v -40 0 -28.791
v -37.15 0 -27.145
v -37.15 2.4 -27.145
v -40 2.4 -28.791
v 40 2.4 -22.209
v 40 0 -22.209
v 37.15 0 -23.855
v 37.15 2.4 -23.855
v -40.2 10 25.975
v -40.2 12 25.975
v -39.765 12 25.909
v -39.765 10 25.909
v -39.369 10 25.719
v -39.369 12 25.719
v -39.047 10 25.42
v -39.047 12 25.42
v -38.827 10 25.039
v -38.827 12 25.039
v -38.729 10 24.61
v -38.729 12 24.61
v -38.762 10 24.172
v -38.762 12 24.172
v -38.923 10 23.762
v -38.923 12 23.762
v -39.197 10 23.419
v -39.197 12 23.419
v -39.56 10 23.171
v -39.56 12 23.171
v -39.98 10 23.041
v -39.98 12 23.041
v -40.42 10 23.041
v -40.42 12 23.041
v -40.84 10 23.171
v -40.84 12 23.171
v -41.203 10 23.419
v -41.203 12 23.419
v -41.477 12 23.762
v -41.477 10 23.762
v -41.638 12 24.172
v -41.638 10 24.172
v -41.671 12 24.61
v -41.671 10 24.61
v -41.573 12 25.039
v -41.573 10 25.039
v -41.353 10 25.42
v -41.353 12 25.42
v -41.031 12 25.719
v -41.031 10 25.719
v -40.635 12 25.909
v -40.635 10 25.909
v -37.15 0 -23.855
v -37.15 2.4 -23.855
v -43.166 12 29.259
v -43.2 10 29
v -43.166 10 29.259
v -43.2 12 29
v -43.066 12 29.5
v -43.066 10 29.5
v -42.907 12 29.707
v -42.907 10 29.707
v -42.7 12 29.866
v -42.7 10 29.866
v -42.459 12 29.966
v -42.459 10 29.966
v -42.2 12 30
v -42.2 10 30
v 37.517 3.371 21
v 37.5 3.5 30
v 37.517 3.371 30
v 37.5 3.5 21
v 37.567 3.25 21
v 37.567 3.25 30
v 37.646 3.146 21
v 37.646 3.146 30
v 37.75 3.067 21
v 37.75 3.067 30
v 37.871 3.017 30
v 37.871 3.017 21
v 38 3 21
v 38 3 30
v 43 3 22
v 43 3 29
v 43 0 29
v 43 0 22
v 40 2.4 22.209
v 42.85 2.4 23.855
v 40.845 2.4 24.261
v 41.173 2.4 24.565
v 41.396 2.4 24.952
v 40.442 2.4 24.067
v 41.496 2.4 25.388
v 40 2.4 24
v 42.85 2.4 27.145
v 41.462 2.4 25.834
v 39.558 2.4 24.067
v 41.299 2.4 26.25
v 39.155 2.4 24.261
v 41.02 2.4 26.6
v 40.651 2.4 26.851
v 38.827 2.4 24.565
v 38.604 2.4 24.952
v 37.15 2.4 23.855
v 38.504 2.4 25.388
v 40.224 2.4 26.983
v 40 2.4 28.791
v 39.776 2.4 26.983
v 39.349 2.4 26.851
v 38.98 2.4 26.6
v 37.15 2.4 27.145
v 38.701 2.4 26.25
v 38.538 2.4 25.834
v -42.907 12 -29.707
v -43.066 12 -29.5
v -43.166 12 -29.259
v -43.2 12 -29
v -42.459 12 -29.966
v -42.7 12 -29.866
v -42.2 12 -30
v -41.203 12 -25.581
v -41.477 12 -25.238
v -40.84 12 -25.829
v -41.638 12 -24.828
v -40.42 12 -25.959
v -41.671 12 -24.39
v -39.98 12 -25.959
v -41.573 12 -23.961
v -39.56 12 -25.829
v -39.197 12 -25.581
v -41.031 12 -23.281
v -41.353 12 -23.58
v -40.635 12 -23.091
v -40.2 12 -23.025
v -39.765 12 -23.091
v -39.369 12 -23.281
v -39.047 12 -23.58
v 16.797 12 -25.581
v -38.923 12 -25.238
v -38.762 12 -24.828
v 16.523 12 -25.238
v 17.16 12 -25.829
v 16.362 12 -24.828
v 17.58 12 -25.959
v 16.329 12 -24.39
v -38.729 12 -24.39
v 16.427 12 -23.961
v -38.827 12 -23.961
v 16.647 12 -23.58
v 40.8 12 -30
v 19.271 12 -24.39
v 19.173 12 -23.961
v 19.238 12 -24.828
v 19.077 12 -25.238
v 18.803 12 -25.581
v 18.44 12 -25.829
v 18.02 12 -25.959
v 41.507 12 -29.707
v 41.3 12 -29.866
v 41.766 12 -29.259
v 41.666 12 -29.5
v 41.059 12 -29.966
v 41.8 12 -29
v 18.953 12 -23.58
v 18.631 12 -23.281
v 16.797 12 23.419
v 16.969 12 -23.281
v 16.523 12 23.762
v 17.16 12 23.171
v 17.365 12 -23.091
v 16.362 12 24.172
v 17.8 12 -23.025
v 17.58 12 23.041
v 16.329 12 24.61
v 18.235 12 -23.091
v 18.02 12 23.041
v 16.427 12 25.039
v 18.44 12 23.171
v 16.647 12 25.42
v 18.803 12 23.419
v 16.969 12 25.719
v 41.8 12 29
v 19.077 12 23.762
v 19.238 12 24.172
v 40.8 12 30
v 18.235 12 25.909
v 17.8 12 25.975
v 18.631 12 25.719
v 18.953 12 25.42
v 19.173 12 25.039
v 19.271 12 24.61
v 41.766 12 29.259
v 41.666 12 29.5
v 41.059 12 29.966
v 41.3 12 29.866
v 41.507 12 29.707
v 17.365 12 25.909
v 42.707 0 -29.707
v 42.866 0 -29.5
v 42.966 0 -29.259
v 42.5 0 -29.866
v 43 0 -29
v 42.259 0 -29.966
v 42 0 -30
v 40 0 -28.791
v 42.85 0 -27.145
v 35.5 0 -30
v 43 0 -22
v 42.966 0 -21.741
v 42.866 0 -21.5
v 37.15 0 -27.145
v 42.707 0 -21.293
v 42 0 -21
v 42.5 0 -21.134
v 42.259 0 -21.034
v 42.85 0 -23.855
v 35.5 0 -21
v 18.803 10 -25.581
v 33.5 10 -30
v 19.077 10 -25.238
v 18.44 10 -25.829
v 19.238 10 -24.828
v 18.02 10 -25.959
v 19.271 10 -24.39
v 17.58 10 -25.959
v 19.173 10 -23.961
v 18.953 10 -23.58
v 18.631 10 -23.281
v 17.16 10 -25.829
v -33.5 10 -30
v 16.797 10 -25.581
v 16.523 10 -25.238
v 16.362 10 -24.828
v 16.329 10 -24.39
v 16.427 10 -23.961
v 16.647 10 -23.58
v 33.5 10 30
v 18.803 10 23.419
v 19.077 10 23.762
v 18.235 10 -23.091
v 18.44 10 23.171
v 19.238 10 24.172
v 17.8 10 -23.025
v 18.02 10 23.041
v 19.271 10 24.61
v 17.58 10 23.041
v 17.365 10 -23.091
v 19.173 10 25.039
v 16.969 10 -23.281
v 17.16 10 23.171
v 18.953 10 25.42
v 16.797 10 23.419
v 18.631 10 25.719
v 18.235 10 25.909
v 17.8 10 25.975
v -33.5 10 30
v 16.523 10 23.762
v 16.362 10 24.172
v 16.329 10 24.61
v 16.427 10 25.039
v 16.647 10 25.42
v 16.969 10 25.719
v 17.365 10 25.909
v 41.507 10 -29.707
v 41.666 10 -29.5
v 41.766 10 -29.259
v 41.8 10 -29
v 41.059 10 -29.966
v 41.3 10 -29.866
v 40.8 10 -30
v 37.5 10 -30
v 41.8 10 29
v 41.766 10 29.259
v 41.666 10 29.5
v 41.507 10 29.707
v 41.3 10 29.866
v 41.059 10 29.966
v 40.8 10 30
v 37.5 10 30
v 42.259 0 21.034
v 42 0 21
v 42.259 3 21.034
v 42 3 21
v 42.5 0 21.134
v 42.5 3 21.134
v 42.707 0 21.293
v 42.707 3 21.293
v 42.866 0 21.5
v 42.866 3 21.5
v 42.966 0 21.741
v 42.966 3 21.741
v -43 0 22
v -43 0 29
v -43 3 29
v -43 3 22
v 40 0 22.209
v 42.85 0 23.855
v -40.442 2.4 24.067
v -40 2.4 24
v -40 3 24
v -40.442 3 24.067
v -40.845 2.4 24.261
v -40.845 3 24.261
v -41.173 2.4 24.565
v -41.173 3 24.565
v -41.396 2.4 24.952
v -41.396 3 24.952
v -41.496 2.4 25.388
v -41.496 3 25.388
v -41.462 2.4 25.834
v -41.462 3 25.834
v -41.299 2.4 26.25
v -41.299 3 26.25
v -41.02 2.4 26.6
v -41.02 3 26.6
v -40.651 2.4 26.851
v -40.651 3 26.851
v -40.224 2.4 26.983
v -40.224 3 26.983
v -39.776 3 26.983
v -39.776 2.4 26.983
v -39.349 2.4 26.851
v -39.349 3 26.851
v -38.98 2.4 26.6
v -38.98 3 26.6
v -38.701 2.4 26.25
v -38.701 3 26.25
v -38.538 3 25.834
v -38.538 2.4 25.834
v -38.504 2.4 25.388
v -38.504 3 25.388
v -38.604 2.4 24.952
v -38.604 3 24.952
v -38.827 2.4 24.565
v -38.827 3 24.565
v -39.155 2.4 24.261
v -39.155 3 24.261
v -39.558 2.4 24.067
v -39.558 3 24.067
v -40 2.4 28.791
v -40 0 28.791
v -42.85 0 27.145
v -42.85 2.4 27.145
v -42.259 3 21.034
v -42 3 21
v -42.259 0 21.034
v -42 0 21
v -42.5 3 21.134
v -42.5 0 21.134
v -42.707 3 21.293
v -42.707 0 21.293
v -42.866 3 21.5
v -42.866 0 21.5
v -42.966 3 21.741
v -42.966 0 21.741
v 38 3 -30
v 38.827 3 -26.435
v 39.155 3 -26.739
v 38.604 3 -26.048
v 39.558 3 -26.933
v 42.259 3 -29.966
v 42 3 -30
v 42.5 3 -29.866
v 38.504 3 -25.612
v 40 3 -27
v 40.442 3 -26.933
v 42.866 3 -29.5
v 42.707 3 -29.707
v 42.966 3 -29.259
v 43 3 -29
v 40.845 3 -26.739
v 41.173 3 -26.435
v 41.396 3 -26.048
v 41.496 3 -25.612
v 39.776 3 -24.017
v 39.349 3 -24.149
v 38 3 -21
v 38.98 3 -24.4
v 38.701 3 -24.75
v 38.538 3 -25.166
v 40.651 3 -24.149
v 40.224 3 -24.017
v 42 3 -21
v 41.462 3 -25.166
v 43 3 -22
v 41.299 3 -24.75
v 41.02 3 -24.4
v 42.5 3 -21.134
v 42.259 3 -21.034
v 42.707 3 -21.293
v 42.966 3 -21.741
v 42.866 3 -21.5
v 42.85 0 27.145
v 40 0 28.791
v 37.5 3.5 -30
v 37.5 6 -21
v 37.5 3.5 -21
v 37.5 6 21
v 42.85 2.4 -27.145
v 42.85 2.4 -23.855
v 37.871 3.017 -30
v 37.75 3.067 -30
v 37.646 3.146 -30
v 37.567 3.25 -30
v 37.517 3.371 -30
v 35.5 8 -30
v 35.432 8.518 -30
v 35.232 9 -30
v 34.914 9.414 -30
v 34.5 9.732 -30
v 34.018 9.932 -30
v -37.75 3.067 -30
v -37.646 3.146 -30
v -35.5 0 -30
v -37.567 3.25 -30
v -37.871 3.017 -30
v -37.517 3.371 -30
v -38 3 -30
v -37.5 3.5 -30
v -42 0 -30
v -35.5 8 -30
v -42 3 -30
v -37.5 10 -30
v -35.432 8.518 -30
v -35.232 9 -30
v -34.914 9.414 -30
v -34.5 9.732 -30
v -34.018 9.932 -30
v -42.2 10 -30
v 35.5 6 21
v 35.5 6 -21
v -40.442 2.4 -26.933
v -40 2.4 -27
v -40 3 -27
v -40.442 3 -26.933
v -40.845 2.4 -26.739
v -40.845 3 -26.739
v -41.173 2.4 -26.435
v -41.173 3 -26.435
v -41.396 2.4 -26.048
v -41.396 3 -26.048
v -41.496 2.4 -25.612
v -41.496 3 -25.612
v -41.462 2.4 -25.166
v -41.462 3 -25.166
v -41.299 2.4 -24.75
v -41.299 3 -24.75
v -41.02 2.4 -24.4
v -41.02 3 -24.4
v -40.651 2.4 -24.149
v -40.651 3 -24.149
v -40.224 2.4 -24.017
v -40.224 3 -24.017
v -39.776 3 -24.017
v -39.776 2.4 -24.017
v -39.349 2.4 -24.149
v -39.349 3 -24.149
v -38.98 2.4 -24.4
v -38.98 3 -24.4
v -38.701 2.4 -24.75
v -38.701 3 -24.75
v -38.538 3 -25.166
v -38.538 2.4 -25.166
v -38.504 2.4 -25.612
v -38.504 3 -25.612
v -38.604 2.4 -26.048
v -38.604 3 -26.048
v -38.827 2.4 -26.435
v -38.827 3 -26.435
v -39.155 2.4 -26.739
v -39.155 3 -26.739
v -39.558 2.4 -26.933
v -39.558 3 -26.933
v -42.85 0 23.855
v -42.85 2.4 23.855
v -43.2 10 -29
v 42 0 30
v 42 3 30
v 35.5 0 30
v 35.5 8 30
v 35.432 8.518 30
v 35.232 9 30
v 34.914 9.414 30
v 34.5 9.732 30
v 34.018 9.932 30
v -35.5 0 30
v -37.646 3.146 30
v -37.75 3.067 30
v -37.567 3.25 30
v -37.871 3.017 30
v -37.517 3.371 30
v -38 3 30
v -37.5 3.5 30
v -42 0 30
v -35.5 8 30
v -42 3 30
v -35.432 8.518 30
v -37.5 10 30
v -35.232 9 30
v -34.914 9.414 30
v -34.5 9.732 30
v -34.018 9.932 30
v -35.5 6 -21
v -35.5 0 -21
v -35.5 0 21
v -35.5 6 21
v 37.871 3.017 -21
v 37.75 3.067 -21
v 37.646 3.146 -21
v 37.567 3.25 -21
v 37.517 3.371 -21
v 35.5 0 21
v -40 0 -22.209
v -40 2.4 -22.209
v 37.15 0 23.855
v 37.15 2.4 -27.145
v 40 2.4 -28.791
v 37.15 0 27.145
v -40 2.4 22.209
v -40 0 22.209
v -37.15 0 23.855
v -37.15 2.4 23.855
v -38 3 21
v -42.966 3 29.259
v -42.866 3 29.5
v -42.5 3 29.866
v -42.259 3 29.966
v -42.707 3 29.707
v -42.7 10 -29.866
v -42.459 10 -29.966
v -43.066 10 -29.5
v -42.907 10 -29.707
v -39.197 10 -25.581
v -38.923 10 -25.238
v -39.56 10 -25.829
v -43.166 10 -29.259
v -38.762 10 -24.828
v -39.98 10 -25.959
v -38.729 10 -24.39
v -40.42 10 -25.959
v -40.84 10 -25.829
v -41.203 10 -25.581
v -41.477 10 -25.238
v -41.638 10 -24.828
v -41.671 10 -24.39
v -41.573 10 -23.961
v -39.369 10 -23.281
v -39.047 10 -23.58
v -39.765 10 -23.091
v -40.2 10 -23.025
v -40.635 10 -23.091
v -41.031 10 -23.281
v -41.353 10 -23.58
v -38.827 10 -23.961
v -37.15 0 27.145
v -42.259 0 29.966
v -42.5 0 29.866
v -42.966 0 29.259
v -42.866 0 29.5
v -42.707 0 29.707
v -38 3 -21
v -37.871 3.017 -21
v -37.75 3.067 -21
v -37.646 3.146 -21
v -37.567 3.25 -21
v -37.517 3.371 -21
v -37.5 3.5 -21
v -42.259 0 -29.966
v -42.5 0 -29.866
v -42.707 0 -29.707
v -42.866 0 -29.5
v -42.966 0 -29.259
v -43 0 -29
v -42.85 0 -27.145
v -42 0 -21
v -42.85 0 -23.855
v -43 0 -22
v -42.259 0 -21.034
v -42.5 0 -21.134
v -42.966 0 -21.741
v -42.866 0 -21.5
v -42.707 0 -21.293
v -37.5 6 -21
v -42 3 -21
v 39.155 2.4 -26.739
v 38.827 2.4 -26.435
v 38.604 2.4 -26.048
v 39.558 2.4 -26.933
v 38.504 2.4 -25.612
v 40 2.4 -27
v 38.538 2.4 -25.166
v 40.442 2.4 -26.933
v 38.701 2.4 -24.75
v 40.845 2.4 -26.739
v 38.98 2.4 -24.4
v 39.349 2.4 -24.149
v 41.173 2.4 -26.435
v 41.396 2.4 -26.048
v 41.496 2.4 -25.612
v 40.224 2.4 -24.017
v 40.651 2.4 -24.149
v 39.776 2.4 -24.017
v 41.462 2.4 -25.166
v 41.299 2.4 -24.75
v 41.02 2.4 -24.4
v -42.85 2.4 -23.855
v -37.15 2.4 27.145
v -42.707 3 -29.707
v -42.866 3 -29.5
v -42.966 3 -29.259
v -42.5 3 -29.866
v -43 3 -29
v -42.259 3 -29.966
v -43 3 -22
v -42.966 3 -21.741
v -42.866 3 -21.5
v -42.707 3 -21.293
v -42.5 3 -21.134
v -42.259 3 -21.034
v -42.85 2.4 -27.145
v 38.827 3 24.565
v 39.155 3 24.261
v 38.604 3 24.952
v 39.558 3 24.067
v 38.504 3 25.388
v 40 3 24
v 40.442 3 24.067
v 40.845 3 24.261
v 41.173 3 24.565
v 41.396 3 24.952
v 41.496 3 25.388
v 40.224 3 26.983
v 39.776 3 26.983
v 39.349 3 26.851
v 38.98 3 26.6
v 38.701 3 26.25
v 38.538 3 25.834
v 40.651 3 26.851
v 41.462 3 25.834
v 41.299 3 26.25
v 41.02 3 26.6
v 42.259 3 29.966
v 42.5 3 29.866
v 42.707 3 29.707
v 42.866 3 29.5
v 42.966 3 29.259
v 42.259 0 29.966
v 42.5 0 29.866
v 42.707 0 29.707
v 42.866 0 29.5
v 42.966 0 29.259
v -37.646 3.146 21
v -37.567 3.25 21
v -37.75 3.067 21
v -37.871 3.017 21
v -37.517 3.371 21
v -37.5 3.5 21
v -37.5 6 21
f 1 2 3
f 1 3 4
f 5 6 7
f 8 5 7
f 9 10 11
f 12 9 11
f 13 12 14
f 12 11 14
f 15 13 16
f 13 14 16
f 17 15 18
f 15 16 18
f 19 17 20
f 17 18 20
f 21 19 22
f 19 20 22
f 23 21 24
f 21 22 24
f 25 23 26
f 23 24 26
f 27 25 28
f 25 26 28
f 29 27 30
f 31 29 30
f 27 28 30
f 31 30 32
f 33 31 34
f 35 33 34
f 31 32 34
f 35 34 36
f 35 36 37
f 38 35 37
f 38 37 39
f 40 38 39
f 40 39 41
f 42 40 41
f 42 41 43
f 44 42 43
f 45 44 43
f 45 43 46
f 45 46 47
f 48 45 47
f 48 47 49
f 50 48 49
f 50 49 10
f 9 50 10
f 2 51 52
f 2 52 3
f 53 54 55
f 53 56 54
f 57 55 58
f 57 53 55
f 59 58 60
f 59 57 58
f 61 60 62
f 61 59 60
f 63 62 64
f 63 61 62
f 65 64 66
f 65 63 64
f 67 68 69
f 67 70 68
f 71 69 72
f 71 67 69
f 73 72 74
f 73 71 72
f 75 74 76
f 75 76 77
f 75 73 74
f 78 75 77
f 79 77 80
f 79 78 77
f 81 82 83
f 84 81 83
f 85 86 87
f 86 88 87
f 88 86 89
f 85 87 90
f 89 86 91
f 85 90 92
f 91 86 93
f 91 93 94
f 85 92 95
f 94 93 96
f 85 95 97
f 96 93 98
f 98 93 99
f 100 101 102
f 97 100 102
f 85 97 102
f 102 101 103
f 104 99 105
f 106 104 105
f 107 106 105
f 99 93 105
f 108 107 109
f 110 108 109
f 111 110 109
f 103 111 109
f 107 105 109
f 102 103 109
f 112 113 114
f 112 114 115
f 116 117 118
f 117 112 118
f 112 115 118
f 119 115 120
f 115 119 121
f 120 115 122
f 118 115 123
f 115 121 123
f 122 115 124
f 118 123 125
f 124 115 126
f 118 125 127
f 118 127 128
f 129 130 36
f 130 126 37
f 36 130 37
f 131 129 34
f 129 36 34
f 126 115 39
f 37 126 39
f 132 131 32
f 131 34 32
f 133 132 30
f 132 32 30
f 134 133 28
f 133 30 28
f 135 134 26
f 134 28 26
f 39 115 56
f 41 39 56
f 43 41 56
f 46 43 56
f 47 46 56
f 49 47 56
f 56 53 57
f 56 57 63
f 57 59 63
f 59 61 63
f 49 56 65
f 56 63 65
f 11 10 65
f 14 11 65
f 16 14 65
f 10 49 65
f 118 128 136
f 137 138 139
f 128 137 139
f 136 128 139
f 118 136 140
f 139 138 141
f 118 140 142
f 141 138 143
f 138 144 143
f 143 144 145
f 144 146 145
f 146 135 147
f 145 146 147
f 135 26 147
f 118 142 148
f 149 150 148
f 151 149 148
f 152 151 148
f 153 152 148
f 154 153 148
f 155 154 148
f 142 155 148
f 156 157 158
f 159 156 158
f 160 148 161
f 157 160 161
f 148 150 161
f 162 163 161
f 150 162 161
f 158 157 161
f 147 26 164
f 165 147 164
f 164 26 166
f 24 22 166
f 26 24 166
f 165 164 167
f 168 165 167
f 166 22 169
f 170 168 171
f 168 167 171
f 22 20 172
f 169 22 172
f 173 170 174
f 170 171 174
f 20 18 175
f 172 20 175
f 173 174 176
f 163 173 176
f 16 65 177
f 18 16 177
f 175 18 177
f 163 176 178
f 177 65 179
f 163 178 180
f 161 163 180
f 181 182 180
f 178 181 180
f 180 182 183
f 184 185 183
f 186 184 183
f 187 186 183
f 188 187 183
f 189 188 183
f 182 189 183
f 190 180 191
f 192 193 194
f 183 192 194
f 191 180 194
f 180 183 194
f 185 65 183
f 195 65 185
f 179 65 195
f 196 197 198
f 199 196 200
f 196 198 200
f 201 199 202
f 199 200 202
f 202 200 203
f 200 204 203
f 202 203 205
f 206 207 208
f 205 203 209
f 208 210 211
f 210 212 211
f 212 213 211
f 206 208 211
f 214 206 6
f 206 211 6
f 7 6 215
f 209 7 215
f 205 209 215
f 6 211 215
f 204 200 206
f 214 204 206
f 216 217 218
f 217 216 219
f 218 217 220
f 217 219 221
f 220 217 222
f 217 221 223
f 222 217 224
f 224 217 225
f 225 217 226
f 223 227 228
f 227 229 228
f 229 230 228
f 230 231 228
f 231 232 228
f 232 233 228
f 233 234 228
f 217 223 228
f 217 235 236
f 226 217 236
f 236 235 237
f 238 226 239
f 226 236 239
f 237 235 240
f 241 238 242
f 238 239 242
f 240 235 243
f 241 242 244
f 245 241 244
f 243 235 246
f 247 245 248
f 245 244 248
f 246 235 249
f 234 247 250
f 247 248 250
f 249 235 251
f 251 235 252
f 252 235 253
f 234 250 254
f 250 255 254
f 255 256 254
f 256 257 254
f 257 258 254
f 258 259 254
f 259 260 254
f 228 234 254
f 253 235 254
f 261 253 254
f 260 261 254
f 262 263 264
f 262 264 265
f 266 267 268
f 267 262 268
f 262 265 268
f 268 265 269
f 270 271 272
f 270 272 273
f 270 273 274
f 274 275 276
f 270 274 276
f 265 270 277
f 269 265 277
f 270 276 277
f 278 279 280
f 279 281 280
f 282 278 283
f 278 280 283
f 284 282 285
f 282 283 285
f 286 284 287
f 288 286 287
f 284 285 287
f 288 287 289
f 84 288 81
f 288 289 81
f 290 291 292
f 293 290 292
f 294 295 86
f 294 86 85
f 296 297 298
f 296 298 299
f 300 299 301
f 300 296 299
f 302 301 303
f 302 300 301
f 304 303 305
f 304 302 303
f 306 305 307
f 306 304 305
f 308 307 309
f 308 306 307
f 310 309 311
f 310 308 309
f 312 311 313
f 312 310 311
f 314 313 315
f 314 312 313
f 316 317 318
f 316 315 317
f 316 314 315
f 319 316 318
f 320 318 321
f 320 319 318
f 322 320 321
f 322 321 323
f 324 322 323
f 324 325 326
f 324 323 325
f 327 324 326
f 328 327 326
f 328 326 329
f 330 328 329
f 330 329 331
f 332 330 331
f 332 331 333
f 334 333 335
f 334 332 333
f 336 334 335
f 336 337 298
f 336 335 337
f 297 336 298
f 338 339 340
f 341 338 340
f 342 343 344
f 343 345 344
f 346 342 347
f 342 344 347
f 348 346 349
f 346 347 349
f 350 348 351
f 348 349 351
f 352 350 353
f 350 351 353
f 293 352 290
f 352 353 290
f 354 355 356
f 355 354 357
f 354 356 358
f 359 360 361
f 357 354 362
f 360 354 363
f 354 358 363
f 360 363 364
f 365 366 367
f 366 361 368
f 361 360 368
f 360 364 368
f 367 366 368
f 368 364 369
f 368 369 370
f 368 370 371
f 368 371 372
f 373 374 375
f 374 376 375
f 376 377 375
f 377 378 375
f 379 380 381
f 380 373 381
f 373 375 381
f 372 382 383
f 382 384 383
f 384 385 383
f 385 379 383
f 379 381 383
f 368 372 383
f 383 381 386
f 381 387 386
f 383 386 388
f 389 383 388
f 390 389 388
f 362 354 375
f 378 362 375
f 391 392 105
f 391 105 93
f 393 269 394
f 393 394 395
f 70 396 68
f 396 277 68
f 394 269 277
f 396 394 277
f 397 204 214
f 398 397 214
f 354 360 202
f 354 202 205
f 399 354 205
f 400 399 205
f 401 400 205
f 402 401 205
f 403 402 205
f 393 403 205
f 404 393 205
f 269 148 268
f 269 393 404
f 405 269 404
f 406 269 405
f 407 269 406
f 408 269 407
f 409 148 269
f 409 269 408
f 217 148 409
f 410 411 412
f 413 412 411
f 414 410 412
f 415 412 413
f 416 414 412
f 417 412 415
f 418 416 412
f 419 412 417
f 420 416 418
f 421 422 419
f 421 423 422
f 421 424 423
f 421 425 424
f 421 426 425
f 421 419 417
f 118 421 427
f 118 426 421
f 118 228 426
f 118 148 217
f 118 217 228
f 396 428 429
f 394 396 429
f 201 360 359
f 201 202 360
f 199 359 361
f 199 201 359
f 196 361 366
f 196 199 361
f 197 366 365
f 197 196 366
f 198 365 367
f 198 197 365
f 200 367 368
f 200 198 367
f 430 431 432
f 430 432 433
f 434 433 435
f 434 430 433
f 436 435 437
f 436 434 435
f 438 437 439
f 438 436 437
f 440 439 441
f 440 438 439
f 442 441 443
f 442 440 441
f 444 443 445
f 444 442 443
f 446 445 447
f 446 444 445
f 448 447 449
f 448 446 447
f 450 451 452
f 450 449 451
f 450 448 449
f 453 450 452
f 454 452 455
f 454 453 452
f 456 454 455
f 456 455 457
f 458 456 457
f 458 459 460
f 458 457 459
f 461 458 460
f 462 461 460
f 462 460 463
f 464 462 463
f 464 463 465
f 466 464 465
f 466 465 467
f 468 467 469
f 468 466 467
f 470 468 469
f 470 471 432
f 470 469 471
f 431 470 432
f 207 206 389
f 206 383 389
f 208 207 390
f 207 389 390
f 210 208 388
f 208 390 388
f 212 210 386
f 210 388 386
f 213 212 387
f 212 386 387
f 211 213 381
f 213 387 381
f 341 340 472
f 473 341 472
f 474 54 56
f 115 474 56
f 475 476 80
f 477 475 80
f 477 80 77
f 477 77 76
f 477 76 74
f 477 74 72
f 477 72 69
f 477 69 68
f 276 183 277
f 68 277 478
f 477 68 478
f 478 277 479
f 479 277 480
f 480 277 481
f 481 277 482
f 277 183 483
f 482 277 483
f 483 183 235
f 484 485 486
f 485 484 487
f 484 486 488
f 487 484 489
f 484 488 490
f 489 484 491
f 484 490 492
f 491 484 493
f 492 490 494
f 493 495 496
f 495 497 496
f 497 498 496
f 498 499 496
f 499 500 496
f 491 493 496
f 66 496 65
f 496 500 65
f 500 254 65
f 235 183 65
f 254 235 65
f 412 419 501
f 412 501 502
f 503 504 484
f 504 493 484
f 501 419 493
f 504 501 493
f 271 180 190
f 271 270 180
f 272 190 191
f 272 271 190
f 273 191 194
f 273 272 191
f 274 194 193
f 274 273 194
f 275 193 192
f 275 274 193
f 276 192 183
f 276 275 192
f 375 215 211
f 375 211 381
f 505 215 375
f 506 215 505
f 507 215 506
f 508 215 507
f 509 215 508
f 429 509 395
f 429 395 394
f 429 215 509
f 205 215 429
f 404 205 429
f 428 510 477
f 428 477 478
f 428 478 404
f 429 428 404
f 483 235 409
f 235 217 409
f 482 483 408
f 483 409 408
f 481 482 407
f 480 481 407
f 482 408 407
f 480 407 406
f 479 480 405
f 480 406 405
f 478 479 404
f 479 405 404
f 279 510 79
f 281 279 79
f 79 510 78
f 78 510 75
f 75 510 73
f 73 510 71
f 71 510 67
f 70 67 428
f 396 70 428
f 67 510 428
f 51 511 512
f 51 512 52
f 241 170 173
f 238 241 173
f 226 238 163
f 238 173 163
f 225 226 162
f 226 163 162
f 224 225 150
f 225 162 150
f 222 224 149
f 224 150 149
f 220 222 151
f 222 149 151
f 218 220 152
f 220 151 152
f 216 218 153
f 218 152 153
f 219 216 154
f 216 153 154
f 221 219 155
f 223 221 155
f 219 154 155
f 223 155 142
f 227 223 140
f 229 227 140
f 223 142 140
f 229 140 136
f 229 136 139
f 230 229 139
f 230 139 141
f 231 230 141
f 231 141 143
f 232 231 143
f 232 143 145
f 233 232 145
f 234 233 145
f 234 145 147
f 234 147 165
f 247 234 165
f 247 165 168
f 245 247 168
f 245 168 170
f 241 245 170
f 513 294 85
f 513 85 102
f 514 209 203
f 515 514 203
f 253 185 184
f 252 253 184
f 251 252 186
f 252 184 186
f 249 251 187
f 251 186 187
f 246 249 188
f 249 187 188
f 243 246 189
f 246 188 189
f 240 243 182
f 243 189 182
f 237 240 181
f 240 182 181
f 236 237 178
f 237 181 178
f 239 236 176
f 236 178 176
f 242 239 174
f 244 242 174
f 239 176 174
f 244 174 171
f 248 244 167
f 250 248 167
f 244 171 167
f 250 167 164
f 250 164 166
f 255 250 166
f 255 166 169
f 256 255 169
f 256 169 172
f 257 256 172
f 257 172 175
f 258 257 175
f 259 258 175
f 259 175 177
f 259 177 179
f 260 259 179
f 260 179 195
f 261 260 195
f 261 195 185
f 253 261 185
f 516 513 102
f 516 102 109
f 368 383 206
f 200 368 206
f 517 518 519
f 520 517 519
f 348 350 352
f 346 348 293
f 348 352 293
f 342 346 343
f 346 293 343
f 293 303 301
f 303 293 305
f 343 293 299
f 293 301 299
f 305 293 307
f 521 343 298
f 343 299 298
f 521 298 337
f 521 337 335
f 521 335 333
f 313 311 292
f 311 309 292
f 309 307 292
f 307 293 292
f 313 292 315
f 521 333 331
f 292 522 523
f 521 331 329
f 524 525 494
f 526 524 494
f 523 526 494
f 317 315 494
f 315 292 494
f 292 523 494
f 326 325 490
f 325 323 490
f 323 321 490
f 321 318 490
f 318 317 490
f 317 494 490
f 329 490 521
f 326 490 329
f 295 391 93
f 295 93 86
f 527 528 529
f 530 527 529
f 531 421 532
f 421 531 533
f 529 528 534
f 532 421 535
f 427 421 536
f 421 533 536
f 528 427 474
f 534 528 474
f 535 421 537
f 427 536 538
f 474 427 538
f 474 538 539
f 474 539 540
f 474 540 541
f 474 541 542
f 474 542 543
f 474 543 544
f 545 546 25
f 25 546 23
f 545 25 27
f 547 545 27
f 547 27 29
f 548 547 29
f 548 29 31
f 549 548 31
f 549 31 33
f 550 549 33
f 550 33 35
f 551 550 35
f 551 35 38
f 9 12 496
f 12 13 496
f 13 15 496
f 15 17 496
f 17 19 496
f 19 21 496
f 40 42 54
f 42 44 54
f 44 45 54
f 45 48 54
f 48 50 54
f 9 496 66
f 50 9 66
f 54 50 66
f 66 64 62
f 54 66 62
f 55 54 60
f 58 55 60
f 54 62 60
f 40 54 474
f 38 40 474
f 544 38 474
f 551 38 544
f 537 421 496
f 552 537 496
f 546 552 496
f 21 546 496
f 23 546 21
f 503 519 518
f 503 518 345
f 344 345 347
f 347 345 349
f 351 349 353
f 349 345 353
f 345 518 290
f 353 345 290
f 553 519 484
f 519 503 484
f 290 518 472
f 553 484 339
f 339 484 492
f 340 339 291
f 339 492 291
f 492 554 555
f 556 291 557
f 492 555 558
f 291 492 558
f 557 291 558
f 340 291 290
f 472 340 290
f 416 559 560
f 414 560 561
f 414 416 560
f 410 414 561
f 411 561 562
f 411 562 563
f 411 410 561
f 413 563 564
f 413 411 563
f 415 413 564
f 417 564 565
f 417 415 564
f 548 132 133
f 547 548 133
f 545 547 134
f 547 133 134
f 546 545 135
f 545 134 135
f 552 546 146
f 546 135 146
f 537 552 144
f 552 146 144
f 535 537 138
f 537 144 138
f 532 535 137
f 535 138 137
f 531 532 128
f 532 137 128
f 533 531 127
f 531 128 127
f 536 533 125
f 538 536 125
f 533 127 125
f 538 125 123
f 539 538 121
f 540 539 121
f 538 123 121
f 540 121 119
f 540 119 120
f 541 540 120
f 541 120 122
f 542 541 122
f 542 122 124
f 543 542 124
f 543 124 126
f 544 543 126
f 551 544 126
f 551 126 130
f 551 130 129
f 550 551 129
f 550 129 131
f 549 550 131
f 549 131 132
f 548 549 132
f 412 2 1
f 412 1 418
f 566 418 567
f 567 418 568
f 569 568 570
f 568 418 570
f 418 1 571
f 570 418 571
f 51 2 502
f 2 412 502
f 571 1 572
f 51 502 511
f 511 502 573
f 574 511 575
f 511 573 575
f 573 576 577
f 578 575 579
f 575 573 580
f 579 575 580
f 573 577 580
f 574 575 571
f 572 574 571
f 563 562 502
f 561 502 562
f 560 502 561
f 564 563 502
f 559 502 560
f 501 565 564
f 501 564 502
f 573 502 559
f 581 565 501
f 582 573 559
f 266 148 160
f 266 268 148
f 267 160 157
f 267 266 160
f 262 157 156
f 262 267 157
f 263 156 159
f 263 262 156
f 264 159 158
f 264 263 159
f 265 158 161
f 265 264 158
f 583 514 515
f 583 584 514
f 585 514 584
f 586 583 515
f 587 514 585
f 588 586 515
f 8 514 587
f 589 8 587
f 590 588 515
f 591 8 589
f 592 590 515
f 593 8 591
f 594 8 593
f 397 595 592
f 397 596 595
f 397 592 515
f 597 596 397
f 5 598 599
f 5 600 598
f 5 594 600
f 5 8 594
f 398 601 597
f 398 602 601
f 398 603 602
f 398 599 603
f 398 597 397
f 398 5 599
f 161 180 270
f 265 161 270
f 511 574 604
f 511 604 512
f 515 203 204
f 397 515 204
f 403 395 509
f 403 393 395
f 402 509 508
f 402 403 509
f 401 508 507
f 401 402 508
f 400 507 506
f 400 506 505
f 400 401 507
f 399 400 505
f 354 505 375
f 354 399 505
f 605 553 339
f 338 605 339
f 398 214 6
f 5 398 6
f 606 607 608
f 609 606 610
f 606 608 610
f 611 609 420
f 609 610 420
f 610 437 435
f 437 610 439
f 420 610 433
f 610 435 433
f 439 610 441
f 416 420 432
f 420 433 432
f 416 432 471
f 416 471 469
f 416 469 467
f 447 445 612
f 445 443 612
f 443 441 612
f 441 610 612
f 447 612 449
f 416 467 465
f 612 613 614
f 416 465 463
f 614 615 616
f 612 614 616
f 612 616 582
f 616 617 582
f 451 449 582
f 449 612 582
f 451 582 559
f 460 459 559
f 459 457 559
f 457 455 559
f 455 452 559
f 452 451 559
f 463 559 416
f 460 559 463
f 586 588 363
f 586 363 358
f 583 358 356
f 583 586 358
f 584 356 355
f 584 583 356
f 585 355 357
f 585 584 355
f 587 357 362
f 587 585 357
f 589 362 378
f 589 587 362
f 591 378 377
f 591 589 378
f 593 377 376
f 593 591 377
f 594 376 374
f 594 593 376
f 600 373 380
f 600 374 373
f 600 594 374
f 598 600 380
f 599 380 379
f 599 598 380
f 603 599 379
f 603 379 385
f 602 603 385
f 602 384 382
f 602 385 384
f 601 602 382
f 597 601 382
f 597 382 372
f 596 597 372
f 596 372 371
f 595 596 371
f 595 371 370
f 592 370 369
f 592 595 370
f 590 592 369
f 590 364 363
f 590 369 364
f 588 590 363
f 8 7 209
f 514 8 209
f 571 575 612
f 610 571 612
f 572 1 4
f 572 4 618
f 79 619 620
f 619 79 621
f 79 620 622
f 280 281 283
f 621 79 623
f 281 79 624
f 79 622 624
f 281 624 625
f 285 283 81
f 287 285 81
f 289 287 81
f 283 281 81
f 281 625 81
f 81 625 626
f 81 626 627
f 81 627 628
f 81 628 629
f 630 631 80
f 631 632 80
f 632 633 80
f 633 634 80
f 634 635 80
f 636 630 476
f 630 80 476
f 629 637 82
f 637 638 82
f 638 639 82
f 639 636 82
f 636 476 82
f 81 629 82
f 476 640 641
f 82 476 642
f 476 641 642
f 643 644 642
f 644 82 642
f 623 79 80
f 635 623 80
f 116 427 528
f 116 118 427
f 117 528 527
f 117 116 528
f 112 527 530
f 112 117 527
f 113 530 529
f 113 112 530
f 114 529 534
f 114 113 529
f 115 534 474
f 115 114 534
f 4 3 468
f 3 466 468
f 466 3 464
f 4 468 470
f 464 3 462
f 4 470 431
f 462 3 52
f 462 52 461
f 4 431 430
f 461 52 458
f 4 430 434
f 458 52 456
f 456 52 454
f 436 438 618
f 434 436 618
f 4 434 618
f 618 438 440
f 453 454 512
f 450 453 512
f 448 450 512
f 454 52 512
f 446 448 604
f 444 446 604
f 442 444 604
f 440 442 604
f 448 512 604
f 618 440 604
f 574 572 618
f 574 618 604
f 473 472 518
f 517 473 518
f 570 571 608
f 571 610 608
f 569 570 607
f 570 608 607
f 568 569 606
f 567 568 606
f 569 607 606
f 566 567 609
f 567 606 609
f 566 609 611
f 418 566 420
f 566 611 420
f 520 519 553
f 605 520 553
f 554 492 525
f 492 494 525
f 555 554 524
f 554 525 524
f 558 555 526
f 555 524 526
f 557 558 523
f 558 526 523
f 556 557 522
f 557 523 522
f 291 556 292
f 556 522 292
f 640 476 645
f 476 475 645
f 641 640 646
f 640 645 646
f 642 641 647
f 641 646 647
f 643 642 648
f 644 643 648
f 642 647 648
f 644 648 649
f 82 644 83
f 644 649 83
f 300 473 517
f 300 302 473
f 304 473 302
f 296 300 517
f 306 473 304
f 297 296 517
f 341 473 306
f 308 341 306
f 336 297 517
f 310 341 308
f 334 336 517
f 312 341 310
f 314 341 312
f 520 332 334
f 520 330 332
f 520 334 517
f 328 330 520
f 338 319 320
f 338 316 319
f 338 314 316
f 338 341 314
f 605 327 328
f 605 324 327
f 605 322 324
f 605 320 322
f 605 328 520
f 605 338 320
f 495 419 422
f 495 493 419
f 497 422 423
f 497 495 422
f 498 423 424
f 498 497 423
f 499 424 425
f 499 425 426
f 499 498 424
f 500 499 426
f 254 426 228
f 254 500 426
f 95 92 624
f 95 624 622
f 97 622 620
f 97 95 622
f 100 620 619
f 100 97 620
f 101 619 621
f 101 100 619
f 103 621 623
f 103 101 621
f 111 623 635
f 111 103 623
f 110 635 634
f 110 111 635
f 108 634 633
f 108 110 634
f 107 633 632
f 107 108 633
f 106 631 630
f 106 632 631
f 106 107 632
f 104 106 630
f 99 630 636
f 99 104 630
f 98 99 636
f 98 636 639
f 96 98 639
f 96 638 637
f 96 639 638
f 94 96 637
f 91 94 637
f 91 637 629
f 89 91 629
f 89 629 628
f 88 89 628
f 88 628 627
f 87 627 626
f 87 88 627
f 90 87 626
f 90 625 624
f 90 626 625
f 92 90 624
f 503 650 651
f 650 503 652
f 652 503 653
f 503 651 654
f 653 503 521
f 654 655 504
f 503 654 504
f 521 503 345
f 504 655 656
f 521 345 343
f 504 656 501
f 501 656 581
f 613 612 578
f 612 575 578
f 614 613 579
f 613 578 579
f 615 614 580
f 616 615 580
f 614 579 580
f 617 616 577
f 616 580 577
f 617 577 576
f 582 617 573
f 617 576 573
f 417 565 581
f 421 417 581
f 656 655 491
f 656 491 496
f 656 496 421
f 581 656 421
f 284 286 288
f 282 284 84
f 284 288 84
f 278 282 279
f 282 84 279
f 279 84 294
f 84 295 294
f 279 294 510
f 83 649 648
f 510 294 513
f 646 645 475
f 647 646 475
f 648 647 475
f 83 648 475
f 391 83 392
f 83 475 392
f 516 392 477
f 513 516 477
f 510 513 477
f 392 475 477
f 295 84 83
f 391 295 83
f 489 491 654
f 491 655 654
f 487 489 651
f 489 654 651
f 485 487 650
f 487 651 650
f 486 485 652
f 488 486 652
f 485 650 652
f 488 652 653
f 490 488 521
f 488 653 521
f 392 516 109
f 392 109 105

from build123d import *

# Parameters (mm, degrees)
EXTRUDE_1_DEPTH          = 30
CUT_EXTRUDE_1_DEPTH      = 54.946640303
CUT_EXTRUDE_1_DEPTH_BACK = 54.946640303
SKETCH_2_W               = 42
SKETCH_2_H               = 12
CUT_EXTRUDE_4_REACH      = 55.947
SKETCH_3_R               = 1.5
SKETCH_5_R               = 1.475
CUT_EXTRUDE_5_DEPTH      = 5
CUT_EXTRUDE_7_DEPTH      = 2.4
FILLET_1_R               = 1
FILLET_5_R               = 0.5
FILLET_7_R               = 2


with BuildPart() as part:
    # 草圖1 → 填料-伸長1 (new, symmetric)
    with BuildSketch(Plane.XY):
        Polygon((-43, 0), (-43, 3), (-37.5, 3), (-37.5, 10), (-43.2, 10), (-43.2, 12), (41.8, 12), (41.8, 10), (37.5, 10), (37.5, 3), (43, 3), (43, 0), (35.5, 0), (35.5, 10), (-35.5, 10), (-35.5, 0), align=None)
    extrude(amount=EXTRUDE_1_DEPTH, both=True)

    # 草圖2 → 除料-伸長1 (cut, two sides: drawn at the far end of the back side and taken through both)
    with BuildSketch(Plane(origin=(0, 0, 0), x_dir=(0, 0, -1), z_dir=(1, 0, 0)).offset(-CUT_EXTRUDE_1_DEPTH_BACK)):
        Rectangle(SKETCH_2_W, SKETCH_2_H)
    extrude(amount=CUT_EXTRUDE_1_DEPTH + CUT_EXTRUDE_1_DEPTH_BACK, mode=Mode.SUBTRACT)

    # 草圖3 → 除料-伸長4 (cut, up to next)
    with BuildSketch(Plane(origin=(0, 0, 0), x_dir=(1, 0, 0), z_dir=(0, 1, 0)), mode=Mode.PRIVATE) as cut_extrude_4_sk1:
        with Locations(Location((-40, 25.5, 0), (0, 0, 90))):
            Circle(SKETCH_3_R)
    cut_extrude_4_tool1 = extrude(cut_extrude_4_sk1.sketch, amount=CUT_EXTRUDE_4_REACH, mode=Mode.PRIVATE) & part.part
    # 草圖3 → 除料-伸長4 (cut, up to next)
    with BuildSketch(Plane(origin=(0, 0, 0), x_dir=(1, 0, 0), z_dir=(0, 1, 0)), mode=Mode.PRIVATE) as cut_extrude_4_sk2:
        with Locations(Location((40, 25.5, 0), (0, 0, 90))):
            Circle(SKETCH_3_R)
    cut_extrude_4_tool2 = extrude(cut_extrude_4_sk2.sketch, amount=CUT_EXTRUDE_4_REACH, mode=Mode.PRIVATE) & part.part
    # 草圖3 → 除料-伸長4 (cut, up to next)
    with BuildSketch(Plane(origin=(0, 0, 0), x_dir=(1, 0, 0), z_dir=(0, 1, 0)), mode=Mode.PRIVATE) as cut_extrude_4_sk3:
        with Locations(Location((40, -25.5, 0), (0, 0, 90))):
            Circle(SKETCH_3_R)
    cut_extrude_4_tool3 = extrude(cut_extrude_4_sk3.sketch, amount=CUT_EXTRUDE_4_REACH, mode=Mode.PRIVATE) & part.part
    # 草圖3 → 除料-伸長4 (cut, up to next)
    with BuildSketch(Plane(origin=(0, 0, 0), x_dir=(1, 0, 0), z_dir=(0, 1, 0)), mode=Mode.PRIVATE) as cut_extrude_4_sk4:
        with Locations(Location((-40, -25.5, 0), (0, 0, 90))):
            Circle(SKETCH_3_R)
    cut_extrude_4_tool4 = extrude(cut_extrude_4_sk4.sketch, amount=CUT_EXTRUDE_4_REACH, mode=Mode.PRIVATE) & part.part
    add(cut_extrude_4_tool1.solids().sort_by_distance((-40, 0, -25.5))[0], mode=Mode.SUBTRACT)
    add(cut_extrude_4_tool2.solids().sort_by_distance((40, 0, -25.5))[0], mode=Mode.SUBTRACT)
    add(cut_extrude_4_tool3.solids().sort_by_distance((40, 0, 25.5))[0], mode=Mode.SUBTRACT)
    add(cut_extrude_4_tool4.solids().sort_by_distance((-40, 0, 25.5))[0], mode=Mode.SUBTRACT)

    # 草圖5 → 除料-伸長5 (cut)
    with BuildSketch(Plane(origin=(0, 12, 0), x_dir=(1, 0, 0), z_dir=(0, 1, 0))):
        with Locations(Location((-40.2, 24.5, 0), (0, 0, 270))):
            Circle(SKETCH_5_R)
        with Locations(Location((-40.2, -24.5, 0), (0, 0, 270))):
            Circle(SKETCH_5_R)
        with Locations(Location((17.8, 24.5, 0), (0, 0, 270))):
            Circle(SKETCH_5_R)
        with Locations(Location((17.8, -24.5, 0), (0, 0, 270))):
            Circle(SKETCH_5_R)
    extrude(amount=-CUT_EXTRUDE_5_DEPTH, mode=Mode.SUBTRACT)

    # 草圖16 → 除料-伸長7 (cut)
    with BuildSketch(Plane.XZ):
        Polygon((-40, 22.209103466), (-37.15, 23.854551733), (-37.15, 27.145448267), (-40, 28.790896534), (-42.85, 27.145448267), (-42.85, 23.854551733), align=None)
        Polygon((-42.85, -23.854551733), (-40, -22.209103466), (-37.15, -23.854551733), (-37.15, -27.145448267), (-40, -28.790896534), (-42.85, -27.145448267), align=None)
        Polygon((40, -22.209103466), (37.15, -23.854551733), (37.15, -27.145448267), (40, -28.790896534), (42.85, -27.145448267), (42.85, -23.854551733), align=None)
        Polygon((42.85, 23.854551733), (40, 22.209103466), (37.15, 23.854551733), (37.15, 27.145448267), (40, 28.790896534), (42.85, 27.145448267), align=None)
    extrude(amount=-CUT_EXTRUDE_7_DEPTH, mode=Mode.SUBTRACT)

    # 圓角1
    fillet_1_edges = [part.edges().sort_by_distance(p)[0] for p in [
        (-43, 1.5, -30),
        (-43.2, 11, -30),
        (41.8, 11, -30),
        (43, 1.5, -30),
        (43, 1.5, 30),
        (41.8, 11, 30),
        (-43, 1.5, 21),
        (-43, 1.5, -21),
        (-43.2, 11, 30),
        (43, 1.5, -21),
        (43, 1.5, 21),
        (-43, 1.5, 30),
    ]]
    fillet(fillet_1_edges, radius=FILLET_1_R)

    # 圓角5
    fillet_5_edges = [part.edges().sort_by_distance(p)[0] for p in [
        (-37.5, 3, 25.5),
        (37.5, 3, 25.5),
        (-37.5, 3, -25.5),
        (37.5, 3, -25.5),
    ]]
    fillet(fillet_5_edges, radius=FILLET_5_R)

    # 圓角7
    fillet_7_edges = [part.edges().sort_by_distance(p)[0] for p in [
        (35.5, 10, 0),
        (-35.5, 10, 0),
    ]]
    fillet(fillet_7_edges, radius=FILLET_7_R)


solid = part.part
